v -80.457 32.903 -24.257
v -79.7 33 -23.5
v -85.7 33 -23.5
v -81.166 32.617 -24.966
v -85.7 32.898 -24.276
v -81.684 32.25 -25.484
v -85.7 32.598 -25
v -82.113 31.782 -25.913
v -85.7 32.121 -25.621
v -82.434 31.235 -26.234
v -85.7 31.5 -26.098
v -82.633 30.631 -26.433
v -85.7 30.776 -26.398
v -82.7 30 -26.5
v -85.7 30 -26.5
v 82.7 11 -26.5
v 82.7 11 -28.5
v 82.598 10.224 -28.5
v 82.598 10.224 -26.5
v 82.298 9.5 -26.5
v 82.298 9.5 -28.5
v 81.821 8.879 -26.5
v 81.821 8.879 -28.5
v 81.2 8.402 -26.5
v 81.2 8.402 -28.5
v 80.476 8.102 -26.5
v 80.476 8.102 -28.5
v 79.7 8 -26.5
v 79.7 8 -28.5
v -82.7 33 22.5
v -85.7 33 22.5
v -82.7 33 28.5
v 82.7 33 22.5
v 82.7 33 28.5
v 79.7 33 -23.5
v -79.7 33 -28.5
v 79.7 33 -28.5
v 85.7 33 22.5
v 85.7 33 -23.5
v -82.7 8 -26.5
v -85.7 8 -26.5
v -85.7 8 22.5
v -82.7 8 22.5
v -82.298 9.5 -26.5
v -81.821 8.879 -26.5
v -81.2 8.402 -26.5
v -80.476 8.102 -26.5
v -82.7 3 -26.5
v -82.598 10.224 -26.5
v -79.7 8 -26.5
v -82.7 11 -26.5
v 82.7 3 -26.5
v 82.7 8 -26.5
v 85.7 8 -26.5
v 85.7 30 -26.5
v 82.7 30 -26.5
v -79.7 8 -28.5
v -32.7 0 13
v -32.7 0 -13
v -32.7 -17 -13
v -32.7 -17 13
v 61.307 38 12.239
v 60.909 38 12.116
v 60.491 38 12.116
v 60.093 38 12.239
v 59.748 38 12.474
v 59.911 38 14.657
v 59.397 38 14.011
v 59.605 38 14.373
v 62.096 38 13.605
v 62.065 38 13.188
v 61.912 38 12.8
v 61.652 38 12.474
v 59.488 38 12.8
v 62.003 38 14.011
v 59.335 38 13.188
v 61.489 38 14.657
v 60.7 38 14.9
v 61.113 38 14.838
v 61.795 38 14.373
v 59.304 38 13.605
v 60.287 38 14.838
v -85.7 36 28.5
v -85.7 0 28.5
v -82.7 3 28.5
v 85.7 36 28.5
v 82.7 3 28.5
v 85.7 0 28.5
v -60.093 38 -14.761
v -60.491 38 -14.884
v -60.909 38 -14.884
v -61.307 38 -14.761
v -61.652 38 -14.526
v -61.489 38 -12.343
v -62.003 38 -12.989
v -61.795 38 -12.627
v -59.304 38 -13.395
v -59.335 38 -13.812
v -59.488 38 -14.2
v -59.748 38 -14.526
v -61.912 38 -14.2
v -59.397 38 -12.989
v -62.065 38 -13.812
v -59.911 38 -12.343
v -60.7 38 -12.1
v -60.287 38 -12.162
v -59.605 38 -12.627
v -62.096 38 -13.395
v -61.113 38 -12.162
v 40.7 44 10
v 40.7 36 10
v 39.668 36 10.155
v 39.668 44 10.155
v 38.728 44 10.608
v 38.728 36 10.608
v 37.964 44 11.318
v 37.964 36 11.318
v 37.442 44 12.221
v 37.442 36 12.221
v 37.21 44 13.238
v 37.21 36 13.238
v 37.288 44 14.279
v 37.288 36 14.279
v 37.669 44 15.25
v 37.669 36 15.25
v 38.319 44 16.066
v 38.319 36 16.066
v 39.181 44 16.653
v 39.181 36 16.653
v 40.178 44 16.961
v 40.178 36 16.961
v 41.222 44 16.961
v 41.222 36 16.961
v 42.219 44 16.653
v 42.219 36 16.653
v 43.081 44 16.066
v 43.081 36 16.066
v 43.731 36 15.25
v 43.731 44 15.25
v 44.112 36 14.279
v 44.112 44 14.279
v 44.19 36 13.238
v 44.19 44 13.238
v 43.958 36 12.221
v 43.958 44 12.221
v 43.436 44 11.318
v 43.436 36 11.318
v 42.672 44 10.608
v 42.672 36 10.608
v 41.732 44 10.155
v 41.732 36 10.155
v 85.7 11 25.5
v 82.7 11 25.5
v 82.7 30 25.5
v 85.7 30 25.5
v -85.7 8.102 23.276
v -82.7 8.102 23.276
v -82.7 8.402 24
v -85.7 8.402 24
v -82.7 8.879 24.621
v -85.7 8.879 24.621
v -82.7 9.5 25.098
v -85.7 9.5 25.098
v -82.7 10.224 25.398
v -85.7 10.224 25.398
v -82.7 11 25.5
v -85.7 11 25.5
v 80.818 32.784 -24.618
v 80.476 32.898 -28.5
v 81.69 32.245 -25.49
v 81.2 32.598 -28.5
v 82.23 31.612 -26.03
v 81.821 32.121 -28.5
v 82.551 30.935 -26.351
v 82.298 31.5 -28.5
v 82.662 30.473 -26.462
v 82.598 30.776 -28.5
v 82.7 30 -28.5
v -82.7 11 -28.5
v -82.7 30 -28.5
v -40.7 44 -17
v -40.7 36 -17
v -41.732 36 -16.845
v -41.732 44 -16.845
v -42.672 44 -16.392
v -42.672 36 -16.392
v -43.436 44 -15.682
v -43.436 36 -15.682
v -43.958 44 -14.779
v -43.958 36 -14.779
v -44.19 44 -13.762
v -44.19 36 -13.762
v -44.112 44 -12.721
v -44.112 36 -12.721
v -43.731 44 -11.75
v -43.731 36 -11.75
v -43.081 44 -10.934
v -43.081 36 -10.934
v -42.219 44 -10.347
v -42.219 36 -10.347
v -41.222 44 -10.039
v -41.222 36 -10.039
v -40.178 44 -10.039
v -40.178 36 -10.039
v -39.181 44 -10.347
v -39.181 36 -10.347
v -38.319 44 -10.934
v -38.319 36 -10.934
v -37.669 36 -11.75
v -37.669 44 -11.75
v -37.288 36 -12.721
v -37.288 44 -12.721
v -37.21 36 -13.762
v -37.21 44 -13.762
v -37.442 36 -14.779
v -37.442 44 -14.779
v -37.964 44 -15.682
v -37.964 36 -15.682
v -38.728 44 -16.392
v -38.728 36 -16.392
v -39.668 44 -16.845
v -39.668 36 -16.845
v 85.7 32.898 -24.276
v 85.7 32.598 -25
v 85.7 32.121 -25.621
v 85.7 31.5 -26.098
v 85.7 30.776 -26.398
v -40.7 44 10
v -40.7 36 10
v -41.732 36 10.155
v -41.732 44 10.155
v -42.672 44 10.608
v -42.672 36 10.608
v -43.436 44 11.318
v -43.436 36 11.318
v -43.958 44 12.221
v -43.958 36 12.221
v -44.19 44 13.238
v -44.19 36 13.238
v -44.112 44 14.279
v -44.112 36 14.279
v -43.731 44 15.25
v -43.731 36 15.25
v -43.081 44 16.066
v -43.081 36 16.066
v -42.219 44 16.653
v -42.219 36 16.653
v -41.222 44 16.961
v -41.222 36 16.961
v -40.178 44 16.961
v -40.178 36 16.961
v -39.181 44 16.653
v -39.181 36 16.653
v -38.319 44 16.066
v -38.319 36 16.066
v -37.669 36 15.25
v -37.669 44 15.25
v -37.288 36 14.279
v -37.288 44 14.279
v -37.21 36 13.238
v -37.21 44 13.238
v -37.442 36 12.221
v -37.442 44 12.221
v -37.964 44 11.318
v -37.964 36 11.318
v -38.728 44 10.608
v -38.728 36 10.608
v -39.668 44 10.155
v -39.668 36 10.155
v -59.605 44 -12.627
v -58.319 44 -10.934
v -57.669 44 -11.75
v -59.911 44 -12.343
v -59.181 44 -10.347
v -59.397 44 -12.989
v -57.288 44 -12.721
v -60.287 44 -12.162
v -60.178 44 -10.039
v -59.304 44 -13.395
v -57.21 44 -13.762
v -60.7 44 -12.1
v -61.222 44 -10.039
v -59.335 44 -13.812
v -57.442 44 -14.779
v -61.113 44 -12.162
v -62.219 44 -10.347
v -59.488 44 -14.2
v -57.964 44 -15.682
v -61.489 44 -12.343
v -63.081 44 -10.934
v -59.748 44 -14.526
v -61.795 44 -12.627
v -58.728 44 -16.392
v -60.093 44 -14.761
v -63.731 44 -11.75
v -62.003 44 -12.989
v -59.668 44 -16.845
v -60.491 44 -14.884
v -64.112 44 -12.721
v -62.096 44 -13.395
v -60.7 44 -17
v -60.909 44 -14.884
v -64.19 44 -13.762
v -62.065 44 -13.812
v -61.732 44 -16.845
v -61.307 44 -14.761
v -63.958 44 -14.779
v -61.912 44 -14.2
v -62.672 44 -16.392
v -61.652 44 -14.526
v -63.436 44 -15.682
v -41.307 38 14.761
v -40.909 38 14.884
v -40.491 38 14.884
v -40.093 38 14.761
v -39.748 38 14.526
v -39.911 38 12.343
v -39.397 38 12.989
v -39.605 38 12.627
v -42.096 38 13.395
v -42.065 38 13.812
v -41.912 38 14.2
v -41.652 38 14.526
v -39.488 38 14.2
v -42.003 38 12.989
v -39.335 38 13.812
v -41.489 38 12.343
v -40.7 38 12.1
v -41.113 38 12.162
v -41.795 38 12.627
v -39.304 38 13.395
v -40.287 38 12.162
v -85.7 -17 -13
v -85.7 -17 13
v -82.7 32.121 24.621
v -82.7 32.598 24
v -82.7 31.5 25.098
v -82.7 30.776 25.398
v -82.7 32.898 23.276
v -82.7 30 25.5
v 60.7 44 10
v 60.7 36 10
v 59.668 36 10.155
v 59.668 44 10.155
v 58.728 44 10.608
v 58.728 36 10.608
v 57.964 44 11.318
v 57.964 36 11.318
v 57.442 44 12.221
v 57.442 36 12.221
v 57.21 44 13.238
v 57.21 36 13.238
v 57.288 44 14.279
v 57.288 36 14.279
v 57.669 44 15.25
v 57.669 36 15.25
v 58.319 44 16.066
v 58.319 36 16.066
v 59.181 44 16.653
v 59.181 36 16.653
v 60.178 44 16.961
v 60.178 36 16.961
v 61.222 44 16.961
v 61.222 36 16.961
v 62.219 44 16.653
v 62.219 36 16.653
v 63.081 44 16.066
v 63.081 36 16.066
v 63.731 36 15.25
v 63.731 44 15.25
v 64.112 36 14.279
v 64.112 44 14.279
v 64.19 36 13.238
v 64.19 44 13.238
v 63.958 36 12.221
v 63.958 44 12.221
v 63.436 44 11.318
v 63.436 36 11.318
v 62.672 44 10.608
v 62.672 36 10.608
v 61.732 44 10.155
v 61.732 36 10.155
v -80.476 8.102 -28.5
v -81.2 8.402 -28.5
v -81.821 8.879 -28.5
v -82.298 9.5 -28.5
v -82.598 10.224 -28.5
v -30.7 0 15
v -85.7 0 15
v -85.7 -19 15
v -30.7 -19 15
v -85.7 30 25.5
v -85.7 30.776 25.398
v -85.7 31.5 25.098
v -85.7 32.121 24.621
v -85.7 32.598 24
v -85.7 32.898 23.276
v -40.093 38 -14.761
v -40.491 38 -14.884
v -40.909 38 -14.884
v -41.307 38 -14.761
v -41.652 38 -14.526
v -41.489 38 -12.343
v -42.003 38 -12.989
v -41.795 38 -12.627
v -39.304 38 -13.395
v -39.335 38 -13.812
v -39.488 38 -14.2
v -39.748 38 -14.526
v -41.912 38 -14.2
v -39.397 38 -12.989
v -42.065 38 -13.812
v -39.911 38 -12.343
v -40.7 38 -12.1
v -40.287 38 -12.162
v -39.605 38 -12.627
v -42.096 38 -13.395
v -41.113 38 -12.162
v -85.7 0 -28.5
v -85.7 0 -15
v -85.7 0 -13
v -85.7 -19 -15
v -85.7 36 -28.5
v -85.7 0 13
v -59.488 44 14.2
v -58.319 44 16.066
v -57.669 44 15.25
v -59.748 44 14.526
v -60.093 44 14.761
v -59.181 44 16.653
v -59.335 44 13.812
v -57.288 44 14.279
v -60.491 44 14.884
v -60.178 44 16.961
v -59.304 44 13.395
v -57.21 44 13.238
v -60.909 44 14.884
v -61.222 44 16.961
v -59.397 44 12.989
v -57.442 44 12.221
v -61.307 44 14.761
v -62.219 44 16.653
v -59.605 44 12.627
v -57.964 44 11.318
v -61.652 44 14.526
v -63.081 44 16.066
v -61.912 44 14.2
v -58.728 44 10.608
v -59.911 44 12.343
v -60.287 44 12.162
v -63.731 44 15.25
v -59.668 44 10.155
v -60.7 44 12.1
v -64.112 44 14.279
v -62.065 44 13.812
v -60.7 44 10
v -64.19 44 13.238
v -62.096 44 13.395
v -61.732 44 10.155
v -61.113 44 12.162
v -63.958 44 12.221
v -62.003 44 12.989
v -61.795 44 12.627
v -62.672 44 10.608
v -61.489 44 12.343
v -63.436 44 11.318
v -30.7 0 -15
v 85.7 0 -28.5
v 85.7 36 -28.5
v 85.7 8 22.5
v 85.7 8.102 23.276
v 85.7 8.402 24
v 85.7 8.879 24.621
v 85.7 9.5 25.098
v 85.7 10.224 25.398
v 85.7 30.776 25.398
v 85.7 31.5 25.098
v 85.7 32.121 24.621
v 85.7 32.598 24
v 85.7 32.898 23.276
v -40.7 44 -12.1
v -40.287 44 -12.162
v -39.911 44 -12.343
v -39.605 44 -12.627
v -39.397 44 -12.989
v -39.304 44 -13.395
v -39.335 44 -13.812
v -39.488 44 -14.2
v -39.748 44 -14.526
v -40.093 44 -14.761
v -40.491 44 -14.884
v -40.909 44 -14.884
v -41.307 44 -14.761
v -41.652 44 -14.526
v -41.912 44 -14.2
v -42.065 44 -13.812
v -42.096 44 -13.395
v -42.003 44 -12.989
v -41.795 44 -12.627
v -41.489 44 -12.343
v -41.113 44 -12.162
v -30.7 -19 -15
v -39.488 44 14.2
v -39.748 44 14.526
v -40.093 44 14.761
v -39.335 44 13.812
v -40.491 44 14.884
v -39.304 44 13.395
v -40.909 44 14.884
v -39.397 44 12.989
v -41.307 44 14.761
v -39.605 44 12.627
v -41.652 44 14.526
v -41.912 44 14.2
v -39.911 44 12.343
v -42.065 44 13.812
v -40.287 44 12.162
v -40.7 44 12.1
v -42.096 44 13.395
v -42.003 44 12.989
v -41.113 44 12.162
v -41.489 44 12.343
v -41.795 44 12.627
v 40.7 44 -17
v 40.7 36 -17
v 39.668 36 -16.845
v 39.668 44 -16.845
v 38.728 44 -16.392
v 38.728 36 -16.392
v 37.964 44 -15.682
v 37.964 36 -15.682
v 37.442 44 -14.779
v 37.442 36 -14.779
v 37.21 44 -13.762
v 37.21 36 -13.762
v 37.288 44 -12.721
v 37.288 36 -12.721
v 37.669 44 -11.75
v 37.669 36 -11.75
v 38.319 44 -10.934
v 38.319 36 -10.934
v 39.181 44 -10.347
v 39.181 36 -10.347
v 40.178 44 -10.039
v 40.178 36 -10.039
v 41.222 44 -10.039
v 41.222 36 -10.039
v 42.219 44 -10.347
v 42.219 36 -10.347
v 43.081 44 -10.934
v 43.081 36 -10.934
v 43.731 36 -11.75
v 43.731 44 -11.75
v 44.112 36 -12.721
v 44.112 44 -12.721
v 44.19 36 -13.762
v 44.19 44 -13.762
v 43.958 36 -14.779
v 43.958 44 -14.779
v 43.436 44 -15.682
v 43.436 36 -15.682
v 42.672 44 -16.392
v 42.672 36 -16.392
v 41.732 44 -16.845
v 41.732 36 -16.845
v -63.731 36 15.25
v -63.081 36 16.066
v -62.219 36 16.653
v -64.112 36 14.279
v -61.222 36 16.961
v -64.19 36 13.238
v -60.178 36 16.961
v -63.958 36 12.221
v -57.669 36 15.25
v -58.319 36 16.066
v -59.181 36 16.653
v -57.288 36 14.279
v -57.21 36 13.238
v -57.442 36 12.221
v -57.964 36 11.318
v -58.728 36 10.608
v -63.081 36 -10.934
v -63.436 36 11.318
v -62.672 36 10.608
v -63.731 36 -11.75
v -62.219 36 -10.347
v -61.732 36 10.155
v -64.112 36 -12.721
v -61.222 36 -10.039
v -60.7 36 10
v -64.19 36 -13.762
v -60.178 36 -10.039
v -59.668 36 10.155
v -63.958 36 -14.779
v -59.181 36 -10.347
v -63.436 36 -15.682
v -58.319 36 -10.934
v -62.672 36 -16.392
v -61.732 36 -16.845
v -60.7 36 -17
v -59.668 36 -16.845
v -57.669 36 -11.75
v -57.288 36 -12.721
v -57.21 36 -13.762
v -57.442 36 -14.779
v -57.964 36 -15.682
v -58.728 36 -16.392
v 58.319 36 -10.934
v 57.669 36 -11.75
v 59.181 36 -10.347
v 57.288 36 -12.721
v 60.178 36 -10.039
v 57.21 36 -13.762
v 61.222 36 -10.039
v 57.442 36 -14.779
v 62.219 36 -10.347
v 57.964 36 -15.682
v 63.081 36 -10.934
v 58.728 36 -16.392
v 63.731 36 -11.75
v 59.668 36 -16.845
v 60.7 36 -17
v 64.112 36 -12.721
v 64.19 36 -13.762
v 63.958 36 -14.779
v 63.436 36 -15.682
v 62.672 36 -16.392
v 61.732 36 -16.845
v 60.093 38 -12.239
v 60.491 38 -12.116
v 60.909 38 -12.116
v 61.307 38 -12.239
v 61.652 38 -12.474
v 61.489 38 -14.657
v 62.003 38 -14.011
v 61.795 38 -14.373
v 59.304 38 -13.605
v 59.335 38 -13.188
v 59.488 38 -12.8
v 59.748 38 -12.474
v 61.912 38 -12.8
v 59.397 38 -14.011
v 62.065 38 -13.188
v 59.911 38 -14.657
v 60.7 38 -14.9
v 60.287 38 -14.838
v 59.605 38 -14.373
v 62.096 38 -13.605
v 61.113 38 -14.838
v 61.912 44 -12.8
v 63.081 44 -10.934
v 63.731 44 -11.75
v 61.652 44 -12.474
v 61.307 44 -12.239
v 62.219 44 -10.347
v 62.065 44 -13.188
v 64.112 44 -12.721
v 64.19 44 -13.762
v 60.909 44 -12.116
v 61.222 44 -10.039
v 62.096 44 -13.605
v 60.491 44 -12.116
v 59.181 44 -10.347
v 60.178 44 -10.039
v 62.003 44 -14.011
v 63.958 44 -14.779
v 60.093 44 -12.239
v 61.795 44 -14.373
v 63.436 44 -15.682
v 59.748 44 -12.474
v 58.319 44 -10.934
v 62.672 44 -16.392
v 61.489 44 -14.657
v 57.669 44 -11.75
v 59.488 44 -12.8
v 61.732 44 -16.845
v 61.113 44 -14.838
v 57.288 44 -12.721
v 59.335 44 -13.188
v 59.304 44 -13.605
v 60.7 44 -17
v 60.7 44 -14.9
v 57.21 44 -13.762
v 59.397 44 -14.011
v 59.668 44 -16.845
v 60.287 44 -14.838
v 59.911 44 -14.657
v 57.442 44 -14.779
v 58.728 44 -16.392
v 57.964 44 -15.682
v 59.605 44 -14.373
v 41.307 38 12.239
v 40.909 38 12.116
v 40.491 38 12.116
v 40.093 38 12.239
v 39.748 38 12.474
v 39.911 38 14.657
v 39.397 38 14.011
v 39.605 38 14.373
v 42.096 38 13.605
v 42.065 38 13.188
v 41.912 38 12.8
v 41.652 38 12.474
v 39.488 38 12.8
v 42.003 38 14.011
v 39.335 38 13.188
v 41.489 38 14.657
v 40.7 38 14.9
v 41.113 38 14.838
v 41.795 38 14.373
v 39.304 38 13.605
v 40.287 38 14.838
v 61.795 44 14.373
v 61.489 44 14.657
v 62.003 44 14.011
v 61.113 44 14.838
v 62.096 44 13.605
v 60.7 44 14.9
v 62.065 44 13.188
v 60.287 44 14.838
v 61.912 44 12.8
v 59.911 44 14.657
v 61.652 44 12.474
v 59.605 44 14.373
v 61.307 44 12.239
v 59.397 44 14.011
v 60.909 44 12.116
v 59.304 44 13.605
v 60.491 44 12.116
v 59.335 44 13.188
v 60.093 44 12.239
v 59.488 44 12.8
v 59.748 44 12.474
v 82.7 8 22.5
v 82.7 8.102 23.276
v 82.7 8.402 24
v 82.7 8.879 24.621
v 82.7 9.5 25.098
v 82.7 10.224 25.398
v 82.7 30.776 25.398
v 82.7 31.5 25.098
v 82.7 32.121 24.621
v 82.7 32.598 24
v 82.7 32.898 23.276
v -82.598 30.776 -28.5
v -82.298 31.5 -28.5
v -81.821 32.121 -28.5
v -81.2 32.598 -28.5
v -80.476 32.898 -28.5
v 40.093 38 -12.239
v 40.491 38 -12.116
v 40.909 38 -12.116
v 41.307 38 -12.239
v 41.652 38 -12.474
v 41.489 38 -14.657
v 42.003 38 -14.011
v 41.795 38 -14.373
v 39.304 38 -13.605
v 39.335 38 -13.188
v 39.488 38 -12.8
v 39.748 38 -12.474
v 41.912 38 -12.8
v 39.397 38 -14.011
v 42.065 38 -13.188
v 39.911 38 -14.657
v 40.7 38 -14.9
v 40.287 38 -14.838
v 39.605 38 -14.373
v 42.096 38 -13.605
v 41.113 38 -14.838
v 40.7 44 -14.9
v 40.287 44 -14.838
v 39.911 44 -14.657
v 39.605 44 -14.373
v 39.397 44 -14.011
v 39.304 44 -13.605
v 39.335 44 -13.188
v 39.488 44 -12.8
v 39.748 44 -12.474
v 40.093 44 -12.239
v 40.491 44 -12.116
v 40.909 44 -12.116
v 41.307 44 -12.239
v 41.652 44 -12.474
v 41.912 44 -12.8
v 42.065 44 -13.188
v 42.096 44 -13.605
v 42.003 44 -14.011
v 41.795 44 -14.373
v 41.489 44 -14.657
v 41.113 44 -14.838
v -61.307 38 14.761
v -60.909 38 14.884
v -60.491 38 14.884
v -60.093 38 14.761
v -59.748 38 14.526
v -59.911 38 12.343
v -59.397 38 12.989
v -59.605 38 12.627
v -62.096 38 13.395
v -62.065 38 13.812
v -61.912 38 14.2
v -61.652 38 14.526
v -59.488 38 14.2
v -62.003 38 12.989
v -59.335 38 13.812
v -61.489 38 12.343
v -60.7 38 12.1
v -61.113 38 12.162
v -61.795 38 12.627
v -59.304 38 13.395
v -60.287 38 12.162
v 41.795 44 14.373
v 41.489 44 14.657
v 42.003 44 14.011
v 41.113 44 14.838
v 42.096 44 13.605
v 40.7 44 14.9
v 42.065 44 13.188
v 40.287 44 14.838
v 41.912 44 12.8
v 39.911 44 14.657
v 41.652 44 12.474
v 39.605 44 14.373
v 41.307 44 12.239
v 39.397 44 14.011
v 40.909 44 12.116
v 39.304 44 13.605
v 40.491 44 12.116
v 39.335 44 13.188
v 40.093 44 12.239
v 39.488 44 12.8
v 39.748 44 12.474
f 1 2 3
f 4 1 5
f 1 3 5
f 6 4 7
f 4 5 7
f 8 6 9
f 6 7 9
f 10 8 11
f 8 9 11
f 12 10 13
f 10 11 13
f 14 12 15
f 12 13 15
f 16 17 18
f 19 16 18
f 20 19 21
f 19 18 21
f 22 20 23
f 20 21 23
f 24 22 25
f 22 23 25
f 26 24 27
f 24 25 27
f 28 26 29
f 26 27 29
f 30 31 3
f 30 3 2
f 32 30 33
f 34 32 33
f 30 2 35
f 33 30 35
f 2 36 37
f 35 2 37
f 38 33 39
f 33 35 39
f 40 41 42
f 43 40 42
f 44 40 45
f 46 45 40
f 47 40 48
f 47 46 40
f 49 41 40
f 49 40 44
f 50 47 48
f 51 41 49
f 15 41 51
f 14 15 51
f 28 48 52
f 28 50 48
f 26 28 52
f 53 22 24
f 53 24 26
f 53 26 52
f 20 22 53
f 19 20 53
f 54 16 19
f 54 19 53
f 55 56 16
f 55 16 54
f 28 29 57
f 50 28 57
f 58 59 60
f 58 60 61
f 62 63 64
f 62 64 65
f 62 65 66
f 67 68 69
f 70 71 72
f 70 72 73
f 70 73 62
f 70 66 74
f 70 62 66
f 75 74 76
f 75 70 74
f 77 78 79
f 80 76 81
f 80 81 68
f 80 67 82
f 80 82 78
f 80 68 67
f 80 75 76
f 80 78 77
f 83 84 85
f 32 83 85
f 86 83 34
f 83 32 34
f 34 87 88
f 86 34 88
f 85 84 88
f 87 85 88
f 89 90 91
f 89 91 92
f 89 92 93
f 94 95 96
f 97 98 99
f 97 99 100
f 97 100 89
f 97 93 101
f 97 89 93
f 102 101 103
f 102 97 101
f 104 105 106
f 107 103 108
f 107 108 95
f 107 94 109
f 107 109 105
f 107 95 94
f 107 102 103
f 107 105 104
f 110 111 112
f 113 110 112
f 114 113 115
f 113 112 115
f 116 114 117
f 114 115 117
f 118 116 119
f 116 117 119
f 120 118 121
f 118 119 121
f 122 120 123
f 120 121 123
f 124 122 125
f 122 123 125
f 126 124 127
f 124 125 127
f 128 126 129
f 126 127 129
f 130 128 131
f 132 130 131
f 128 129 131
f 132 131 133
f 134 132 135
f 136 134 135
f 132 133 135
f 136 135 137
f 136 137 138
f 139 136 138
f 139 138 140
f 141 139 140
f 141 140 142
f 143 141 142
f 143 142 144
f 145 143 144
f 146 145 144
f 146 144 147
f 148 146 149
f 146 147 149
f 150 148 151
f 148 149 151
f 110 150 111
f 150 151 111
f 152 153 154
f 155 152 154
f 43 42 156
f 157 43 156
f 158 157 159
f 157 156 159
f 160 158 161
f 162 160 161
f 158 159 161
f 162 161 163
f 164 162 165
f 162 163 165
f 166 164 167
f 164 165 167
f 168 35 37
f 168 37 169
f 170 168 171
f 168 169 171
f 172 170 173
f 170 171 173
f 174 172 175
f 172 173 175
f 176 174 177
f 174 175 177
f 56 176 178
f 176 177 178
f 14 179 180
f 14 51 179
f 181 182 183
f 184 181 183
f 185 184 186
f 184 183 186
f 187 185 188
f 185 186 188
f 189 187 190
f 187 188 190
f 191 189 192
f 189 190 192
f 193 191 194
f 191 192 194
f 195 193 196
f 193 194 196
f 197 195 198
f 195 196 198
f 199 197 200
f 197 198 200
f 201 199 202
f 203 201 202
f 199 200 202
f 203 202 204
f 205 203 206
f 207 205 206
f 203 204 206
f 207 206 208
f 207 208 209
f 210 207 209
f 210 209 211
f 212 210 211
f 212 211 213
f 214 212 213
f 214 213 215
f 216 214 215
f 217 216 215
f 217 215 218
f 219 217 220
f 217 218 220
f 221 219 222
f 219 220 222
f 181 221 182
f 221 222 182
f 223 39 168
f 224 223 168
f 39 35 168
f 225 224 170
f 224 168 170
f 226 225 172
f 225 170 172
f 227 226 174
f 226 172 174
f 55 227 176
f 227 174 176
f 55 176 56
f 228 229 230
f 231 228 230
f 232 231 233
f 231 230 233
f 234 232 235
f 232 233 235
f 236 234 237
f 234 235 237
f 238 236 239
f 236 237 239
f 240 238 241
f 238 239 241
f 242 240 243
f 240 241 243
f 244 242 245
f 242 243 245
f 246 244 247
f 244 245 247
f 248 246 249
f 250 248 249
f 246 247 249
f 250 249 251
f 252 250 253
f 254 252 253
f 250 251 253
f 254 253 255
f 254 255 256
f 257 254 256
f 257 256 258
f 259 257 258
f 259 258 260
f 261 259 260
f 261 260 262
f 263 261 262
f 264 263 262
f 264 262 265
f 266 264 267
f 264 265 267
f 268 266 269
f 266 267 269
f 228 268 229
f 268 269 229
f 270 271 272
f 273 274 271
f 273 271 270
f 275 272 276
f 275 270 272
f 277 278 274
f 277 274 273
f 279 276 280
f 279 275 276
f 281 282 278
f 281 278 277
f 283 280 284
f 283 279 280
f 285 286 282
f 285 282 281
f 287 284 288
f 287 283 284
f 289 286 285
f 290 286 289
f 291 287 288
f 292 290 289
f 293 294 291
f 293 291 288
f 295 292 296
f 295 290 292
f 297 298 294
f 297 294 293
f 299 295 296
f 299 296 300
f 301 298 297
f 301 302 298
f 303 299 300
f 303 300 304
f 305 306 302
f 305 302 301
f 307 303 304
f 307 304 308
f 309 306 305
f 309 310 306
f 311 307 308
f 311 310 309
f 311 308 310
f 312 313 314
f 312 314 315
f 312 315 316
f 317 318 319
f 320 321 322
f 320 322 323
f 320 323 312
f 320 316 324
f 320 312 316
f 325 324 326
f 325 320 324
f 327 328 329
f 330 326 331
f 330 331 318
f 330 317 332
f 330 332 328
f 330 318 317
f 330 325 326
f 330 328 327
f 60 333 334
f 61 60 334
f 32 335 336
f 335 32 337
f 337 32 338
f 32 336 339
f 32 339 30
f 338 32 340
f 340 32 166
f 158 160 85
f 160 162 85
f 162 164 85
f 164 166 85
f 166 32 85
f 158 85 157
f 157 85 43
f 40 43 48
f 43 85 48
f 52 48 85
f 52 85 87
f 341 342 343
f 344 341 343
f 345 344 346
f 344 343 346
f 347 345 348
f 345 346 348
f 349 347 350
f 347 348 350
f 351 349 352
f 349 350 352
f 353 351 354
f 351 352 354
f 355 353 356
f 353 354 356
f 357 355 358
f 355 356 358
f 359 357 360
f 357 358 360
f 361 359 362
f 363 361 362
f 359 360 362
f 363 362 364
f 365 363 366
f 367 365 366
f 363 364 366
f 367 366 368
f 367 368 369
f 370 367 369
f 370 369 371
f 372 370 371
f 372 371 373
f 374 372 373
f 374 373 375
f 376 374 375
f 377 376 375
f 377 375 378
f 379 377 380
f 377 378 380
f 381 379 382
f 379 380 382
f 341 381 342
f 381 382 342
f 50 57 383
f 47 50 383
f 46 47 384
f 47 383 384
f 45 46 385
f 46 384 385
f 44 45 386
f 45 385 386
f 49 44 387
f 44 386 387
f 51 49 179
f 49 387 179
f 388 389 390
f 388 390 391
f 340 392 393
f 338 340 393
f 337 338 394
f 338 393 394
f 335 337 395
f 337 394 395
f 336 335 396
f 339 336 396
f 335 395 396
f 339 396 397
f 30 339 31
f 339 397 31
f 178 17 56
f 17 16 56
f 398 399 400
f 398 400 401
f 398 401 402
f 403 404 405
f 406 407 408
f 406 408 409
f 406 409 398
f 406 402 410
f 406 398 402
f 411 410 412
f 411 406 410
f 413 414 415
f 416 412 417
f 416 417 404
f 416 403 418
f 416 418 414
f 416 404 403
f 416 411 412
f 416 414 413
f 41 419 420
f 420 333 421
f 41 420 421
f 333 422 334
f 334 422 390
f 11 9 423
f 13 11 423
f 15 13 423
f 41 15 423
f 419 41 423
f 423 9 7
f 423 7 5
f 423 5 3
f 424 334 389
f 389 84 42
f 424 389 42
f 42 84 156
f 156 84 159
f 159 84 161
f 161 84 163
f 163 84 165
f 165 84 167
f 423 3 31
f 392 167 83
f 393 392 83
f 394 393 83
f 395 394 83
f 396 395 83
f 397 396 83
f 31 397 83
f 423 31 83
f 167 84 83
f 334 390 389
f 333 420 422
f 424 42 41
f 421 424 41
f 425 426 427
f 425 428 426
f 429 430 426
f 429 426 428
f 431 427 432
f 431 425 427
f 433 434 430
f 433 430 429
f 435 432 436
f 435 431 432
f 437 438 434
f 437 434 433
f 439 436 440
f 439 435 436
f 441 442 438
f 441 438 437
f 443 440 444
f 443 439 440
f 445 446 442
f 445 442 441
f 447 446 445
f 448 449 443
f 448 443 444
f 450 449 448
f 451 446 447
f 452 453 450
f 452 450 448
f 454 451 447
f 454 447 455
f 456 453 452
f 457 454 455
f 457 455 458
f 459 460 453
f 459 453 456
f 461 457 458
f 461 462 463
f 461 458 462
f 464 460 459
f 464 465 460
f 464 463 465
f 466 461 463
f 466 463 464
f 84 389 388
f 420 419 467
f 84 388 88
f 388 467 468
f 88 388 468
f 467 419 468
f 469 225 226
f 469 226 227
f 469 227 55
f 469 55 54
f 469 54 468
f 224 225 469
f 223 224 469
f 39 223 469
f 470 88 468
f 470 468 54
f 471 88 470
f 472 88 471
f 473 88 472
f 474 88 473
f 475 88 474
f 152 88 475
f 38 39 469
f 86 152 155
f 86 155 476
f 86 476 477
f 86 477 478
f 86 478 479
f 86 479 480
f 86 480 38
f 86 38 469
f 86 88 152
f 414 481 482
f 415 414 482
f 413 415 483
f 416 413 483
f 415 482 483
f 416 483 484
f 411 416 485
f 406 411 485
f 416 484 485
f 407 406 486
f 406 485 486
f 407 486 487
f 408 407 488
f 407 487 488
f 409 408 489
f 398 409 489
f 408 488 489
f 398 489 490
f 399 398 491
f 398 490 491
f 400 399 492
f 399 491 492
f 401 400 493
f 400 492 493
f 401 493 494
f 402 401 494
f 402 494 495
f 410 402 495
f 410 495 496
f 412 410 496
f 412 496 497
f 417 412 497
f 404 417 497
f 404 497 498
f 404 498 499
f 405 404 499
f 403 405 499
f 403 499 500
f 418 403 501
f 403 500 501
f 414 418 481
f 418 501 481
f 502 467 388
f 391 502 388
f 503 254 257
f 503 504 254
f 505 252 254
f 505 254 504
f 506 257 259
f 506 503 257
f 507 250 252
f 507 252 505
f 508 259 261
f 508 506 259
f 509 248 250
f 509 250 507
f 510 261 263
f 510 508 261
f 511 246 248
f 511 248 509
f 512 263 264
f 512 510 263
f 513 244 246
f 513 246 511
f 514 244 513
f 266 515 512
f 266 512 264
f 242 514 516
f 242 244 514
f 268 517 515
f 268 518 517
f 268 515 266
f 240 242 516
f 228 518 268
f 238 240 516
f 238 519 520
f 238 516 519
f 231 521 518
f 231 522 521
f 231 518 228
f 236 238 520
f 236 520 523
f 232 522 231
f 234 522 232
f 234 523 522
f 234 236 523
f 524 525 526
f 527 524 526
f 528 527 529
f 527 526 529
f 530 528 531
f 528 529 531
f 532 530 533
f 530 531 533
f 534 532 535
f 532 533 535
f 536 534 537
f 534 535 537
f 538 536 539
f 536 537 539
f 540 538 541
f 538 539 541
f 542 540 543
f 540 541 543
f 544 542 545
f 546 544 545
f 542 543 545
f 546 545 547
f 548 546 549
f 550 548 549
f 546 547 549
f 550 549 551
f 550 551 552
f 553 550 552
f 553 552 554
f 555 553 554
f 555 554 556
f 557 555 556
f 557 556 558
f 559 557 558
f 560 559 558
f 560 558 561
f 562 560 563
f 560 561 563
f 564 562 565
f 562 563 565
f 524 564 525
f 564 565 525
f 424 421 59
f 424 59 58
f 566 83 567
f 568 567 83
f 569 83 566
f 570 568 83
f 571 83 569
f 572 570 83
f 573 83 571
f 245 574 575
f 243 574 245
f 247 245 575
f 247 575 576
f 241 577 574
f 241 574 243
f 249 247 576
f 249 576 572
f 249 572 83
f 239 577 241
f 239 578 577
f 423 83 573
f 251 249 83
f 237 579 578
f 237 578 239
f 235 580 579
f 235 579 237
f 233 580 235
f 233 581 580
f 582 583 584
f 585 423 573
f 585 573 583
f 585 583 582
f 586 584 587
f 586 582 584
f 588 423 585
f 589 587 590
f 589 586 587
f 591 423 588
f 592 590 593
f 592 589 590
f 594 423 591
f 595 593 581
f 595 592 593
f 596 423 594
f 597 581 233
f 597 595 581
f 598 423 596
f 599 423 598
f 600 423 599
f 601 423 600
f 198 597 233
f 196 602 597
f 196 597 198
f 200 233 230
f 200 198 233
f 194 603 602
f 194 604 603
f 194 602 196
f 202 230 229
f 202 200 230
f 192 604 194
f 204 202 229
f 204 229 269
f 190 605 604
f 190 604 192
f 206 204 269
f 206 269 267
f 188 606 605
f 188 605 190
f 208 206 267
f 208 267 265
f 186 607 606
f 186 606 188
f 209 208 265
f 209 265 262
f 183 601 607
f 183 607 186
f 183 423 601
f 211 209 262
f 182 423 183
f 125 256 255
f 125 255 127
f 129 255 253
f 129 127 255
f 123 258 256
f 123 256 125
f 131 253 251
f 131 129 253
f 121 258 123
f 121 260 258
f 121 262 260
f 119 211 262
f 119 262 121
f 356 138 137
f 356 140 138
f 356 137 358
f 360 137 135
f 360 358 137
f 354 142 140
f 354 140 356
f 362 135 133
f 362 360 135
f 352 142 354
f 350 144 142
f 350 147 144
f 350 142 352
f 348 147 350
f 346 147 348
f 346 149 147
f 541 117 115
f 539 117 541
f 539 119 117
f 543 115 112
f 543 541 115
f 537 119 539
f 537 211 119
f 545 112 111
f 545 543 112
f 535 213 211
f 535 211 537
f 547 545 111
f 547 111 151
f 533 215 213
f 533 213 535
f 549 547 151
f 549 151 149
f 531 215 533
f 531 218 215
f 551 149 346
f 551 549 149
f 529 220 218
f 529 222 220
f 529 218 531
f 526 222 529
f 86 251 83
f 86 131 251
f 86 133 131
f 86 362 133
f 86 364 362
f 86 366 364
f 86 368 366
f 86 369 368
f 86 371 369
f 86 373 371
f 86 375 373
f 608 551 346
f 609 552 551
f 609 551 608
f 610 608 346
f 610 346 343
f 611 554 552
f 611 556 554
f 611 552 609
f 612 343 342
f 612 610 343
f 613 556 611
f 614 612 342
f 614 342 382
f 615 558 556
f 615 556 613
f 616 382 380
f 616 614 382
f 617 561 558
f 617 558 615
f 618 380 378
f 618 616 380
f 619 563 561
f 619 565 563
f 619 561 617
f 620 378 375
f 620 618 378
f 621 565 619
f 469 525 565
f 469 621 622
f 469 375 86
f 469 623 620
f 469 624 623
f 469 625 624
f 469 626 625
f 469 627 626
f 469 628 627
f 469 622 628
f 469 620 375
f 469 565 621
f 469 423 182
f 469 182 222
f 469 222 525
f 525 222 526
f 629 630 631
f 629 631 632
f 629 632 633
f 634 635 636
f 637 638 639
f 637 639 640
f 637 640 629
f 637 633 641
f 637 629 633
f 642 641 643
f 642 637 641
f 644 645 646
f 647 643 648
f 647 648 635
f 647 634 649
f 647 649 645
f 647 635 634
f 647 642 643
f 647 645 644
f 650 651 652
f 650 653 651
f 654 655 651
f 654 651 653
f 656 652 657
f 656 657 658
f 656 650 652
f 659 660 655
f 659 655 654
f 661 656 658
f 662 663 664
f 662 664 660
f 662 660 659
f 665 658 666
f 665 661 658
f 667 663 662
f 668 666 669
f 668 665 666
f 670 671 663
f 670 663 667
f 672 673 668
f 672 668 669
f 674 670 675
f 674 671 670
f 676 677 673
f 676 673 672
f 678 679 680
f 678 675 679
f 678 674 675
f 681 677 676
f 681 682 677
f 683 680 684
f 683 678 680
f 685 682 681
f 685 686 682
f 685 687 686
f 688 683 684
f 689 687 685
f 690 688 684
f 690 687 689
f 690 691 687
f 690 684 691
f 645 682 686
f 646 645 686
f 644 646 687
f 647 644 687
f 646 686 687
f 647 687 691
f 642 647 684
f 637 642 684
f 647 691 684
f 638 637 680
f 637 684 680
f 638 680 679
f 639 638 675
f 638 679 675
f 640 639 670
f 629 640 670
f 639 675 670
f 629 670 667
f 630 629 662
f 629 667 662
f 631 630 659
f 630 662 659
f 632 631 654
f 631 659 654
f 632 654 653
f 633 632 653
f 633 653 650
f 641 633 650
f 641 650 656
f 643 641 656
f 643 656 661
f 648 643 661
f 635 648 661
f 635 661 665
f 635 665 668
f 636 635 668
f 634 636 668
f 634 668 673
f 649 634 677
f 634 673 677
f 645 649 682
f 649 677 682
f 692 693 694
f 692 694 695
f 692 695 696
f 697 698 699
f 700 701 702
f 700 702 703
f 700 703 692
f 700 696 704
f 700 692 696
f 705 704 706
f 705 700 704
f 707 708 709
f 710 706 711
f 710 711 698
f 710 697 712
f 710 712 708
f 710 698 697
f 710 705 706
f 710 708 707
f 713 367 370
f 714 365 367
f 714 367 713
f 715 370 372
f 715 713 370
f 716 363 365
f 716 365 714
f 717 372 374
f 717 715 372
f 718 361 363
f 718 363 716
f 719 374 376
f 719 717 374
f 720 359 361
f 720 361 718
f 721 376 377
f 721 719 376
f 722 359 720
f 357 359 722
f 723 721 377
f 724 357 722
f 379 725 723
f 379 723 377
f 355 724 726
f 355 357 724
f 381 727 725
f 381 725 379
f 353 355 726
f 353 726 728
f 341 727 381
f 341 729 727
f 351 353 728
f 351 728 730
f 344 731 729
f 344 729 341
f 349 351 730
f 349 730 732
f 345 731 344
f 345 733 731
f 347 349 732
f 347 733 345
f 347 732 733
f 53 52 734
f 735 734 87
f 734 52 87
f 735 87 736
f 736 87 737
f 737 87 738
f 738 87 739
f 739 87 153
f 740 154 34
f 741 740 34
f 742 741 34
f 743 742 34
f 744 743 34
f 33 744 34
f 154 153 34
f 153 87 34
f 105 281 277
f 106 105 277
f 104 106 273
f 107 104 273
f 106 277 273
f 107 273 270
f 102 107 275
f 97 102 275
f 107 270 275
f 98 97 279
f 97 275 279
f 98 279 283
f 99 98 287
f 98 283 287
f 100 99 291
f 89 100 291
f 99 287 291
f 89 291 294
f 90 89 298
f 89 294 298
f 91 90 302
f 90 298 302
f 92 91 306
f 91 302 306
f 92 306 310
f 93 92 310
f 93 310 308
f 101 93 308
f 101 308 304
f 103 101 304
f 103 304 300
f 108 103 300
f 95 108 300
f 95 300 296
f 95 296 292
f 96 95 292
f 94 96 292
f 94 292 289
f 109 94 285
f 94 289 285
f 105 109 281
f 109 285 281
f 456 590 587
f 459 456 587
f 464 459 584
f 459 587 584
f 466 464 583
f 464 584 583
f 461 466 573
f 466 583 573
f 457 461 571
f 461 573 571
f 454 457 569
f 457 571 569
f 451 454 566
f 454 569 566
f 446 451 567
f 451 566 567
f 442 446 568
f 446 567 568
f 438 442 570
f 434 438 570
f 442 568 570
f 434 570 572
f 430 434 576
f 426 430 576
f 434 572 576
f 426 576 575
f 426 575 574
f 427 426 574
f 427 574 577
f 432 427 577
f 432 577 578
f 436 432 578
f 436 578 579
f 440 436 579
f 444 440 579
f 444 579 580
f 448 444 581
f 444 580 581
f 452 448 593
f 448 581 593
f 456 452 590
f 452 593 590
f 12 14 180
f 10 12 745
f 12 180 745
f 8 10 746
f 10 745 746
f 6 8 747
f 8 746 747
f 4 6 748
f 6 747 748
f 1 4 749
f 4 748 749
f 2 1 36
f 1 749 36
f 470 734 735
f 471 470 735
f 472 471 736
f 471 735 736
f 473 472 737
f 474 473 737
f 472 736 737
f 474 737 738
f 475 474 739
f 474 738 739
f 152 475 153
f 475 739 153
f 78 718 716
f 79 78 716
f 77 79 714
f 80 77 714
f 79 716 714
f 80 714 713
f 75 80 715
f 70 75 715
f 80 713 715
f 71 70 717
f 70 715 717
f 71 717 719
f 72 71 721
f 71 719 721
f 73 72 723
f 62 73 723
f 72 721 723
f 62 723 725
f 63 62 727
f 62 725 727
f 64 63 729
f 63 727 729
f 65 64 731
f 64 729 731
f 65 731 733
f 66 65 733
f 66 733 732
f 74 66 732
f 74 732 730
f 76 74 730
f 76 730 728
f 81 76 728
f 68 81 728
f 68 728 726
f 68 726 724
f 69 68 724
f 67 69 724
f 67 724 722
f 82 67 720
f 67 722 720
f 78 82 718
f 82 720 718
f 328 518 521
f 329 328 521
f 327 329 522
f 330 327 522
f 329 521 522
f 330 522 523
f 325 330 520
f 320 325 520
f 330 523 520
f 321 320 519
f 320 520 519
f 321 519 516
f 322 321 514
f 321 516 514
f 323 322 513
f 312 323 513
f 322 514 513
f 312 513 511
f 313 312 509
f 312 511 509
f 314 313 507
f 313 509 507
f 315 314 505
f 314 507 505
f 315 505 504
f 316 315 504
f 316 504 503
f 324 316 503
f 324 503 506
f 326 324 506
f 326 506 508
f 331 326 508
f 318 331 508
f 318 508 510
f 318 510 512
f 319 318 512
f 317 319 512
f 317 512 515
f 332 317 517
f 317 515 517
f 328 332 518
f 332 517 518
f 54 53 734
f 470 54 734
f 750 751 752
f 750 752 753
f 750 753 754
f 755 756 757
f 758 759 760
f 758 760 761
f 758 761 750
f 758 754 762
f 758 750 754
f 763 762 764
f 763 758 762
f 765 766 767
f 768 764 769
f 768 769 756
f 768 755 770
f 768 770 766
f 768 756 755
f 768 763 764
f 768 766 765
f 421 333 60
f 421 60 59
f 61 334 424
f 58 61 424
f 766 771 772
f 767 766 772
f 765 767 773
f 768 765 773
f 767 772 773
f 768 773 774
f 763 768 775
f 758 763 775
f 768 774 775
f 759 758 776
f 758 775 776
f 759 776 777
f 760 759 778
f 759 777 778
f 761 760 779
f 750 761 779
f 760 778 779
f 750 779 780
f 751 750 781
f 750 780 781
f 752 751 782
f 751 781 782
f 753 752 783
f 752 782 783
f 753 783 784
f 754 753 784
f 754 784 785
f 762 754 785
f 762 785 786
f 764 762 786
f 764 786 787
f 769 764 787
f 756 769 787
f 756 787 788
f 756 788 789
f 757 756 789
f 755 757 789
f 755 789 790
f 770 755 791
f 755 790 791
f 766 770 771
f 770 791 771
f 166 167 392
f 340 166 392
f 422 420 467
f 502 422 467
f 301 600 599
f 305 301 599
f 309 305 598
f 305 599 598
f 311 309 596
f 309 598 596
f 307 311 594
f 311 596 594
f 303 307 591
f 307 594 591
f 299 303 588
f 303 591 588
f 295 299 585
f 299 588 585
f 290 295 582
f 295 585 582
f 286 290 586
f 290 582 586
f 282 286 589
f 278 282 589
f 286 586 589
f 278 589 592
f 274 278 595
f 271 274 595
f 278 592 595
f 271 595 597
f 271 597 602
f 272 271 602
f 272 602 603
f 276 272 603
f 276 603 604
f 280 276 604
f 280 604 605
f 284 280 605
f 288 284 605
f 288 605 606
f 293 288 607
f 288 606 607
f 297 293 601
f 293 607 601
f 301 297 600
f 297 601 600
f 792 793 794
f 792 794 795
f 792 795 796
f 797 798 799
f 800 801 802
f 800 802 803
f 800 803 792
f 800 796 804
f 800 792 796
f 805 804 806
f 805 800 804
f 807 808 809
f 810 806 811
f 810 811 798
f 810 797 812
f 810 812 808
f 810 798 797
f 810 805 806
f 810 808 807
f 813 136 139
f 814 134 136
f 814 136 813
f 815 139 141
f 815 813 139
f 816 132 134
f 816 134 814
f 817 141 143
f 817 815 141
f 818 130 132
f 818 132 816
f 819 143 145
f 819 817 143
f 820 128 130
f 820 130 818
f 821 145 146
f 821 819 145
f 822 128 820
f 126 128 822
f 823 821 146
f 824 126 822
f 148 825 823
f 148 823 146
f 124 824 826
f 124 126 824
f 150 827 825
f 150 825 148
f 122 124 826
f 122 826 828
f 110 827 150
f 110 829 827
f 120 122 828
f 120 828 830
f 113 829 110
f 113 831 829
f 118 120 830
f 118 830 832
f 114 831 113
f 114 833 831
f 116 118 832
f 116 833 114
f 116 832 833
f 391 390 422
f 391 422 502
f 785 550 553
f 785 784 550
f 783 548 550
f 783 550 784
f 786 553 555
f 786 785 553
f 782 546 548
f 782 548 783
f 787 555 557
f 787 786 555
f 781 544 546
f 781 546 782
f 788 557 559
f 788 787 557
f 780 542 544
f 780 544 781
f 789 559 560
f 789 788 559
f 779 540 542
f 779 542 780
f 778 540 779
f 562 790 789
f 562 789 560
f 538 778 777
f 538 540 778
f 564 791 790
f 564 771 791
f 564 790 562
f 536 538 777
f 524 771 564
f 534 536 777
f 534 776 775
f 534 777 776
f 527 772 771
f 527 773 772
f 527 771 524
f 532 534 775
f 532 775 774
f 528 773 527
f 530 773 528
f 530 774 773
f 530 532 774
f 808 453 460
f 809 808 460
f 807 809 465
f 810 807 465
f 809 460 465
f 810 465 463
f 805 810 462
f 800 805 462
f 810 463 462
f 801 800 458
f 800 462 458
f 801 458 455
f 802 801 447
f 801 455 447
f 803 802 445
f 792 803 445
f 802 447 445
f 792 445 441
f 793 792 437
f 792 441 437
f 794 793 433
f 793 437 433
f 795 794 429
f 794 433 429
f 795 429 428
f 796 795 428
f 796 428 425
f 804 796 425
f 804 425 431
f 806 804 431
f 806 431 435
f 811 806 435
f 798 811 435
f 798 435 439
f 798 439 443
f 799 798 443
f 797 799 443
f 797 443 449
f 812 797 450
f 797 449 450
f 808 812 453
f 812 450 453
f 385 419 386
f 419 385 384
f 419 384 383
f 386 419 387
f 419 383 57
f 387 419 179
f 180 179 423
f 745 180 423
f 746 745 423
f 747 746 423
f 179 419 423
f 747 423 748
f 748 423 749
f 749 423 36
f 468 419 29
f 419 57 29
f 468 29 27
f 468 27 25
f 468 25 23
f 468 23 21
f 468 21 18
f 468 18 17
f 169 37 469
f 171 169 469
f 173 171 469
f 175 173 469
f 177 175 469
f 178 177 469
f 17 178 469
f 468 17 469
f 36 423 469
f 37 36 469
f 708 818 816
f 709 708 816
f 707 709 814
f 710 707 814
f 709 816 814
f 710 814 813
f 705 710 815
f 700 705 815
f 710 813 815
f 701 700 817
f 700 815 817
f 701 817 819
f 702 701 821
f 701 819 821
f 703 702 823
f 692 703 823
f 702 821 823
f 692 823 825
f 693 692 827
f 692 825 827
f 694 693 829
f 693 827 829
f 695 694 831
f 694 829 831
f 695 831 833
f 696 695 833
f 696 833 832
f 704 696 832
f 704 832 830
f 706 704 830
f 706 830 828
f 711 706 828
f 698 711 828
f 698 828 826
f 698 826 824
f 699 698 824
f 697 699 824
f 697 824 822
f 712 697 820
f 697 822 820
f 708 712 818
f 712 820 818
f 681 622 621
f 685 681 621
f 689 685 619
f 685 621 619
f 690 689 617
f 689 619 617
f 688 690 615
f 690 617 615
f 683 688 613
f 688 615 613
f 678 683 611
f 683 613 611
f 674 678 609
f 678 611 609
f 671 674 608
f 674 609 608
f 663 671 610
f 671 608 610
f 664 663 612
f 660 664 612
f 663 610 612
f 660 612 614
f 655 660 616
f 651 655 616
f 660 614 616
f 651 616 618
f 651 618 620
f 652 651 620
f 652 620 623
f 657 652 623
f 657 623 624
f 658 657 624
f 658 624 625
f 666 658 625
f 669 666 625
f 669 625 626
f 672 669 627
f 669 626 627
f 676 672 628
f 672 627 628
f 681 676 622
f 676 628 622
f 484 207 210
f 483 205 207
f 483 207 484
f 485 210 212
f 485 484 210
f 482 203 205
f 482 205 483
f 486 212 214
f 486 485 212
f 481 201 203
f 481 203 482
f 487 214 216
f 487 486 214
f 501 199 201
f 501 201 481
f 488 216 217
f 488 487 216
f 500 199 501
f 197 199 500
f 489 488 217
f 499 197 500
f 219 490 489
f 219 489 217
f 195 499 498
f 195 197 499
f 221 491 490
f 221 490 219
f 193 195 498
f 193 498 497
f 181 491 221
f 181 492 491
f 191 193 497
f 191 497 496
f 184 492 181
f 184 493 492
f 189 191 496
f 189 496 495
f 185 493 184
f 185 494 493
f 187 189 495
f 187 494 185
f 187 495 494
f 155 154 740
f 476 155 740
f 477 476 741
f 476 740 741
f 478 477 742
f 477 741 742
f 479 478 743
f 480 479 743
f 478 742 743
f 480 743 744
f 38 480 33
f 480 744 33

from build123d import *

# Parameters (mm, degrees)
SKETCH1_W           = 171.4
SKETCH1_H           = 57
BOSS_EXTRUDE1_DEPTH = 3
BOSS_EXTRUDE2_DEPTH = 30
SKETCH3_W           = 52
SKETCH3_H           = 25
CUT_EXTRUDE1_DEPTH  = 192
SKETCH4_W           = 171.4
SKETCH4_H           = 57
BOSS_EXTRUDE3_DEPTH = 3
SKETCH5_R           = 3.5
BOSS_EXTRUDE4_DEPTH = 8
SKETCH6_R           = 1.4
CUT_EXTRUDE2_DEPTH  = 6
SKETCH8_W           = 165.4
SKETCH8_H           = 25
CUT_EXTRUDE3_DEPTH  = 6
FILLET2_START       = -85.7
FILLET2_DEPTH       = 3
FILLET2_START_2     = 82.7
FILLET2_2_DEPTH     = 3
FILLET2_START_3     = -28.5
FILLET2_3_DEPTH     = 5
FILLET2_4_DEPTH     = 2
FILLET2_START_4     = -82.7
FILLET2_5_DEPTH     = 165.4
SKETCH9_W           = 55
SKETCH9_H           = 30
BOSS_EXTRUDE5_DEPTH = 19
SKETCH10_W          = 26
SKETCH10_H          = 17
CUT_EXTRUDE4_DEPTH  = 53


with BuildPart() as part:
    # Sketch1 → Boss-Extrude1 (new body)
    with BuildSketch(Plane(origin=(0, 0, 0), x_dir=(1, 0, 0), z_dir=(0, 1, 0))):
        Rectangle(SKETCH1_W, SKETCH1_H)
    extrude(amount=BOSS_EXTRUDE1_DEPTH)

    # Sketch2 → Boss-Extrude2 (add)
    with BuildSketch(Plane(origin=(0, 3, 0), x_dir=(1, 0, 0), z_dir=(0, 1, 0))):
        Polygon((-85.7, -28.5), (-82.7, -28.5), (-82.7, 26.5), (82.7, 26.5), (82.7, -28.5), (85.7, -28.5), (85.7, 28.5), (-85.7, 28.5), align=None)
    extrude(amount=BOSS_EXTRUDE2_DEPTH)

    # Sketch3 → Cut-Extrude1 (cut)
    with BuildSketch(Plane.ZY.offset(85.7)):
        with Locations((-0.5, 20.5)):
            Rectangle(SKETCH3_W, SKETCH3_H)
    extrude(amount=-CUT_EXTRUDE1_DEPTH, mode=Mode.SUBTRACT)

    # Sketch4 → Boss-Extrude3 (add)
    with BuildSketch(Plane(origin=(0, 33, 0), x_dir=(1, 0, 0), z_dir=(0, 1, 0))):
        Rectangle(SKETCH4_W, SKETCH4_H)
    extrude(amount=BOSS_EXTRUDE3_DEPTH)

    # Sketch5 → Boss-Extrude4 (add)
    with BuildSketch(Plane(origin=(0, 36, 0), x_dir=(1, 0, 0), z_dir=(0, 1, 0))):
        with Locations(Location((-60.7, 13.5, 0), (0, 0, 90))):
            Circle(SKETCH5_R)
        with Locations(Location((-40.7, 13.5, 0), (0, 0, 90))):
            Circle(SKETCH5_R)
        with Locations(Location((-40.7, -13.5, 0), (0, 0, 90))):
            Circle(SKETCH5_R)
        with Locations(Location((-60.7, -13.5, 0), (0, 0, 90))):
            Circle(SKETCH5_R)
        with Locations(Location((60.7, -13.5, 0), (0, 0, 90))):
            Circle(SKETCH5_R)
        with Locations(Location((40.7, -13.5, 0), (0, 0, 90))):
            Circle(SKETCH5_R)
        with Locations(Location((40.7, 13.5, 0), (0, 0, 90))):
            Circle(SKETCH5_R)
        with Locations(Location((60.7, 13.5, 0), (0, 0, 90))):
            Circle(SKETCH5_R)
    extrude(amount=BOSS_EXTRUDE4_DEPTH)

    # Sketch6 → Cut-Extrude2 (cut)
    with BuildSketch(Plane(origin=(0, 44, 0), x_dir=(1, 0, 0), z_dir=(0, 1, 0))):
        with Locations(Location((-60.7, 13.5, 0), (0, 0, 270))):
            Circle(SKETCH6_R)
        with Locations(Location((-40.7, 13.5, 0), (0, 0, 270))):
            Circle(SKETCH6_R)
        with Locations(Location((-40.7, -13.5, 0), (0, 0, 90))):
            Circle(SKETCH6_R)
        with Locations(Location((-60.7, -13.5, 0), (0, 0, 90))):
            Circle(SKETCH6_R)
        with Locations(Location((60.7, -13.5, 0), (0, 0, 270))):
            Circle(SKETCH6_R)
        with Locations(Location((40.7, -13.5, 0), (0, 0, 270))):
            Circle(SKETCH6_R)
        with Locations(Location((40.7, 13.5, 0), (0, 0, 90))):
            Circle(SKETCH6_R)
        with Locations(Location((60.7, 13.5, 0), (0, 0, 90))):
            Circle(SKETCH6_R)
    extrude(amount=-CUT_EXTRUDE2_DEPTH, mode=Mode.SUBTRACT)

    # Sketch8 → Cut-Extrude3 (cut)
    with BuildSketch(Plane(origin=(0, 0, -28.5), x_dir=(-1, 0, 0), z_dir=(0, 0, -1))):
        with Locations((0, 20.5)):
            Rectangle(SKETCH8_W, SKETCH8_H)
    extrude(amount=-CUT_EXTRUDE3_DEPTH, mode=Mode.SUBTRACT)

    # Fillet2: read off the stored shape, not the designer's step
    # Fillet2 outline → Fillet2 (add)
    with BuildSketch(Plane.YZ.offset(FILLET2_START)):
        with BuildLine():
            ThreePointArc((33, -23.5), (32.121320344, -25.621320344), (30, -26.5))
            Line((30, -26.5), (33, -26.5))
            Line((33, -26.5), (33, -23.5))
        make_face()
        with BuildLine():
            ThreePointArc((30, 25.5), (32.121320344, 24.621320344), (33, 22.5))
            Line((33, 22.5), (33, 25.5))
            Line((33, 25.5), (30, 25.5))
        make_face()
        with BuildLine():
            Line((8, 25.5), (8, 22.5))
            ThreePointArc((8, 22.5), (8.878679656, 24.621320344), (11, 25.5))
            Line((11, 25.5), (8, 25.5))
        make_face()
    extrude(amount=FILLET2_DEPTH)

    # Fillet2 2 outline → Fillet2 2 (add)
    with BuildSketch(Plane.YZ.offset(FILLET2_START_2)):
        with BuildLine():
            ThreePointArc((33, -23.5), (32.121320344, -25.621320344), (30, -26.5))
            Line((30, -26.5), (33, -26.5))
            Line((33, -26.5), (33, -23.5))
        make_face()
        with BuildLine():
            ThreePointArc((30, 25.5), (32.121320344, 24.621320344), (33, 22.5))
            Line((33, 22.5), (33, 25.5))
            Line((33, 25.5), (30, 25.5))
        make_face()
        with BuildLine():
            Line((8, 25.5), (8, 22.5))
            ThreePointArc((8, 22.5), (8.878679656, 24.621320344), (11, 25.5))
            Line((11, 25.5), (8, 25.5))
        make_face()
    extrude(amount=FILLET2_2_DEPTH)

    # Fillet2 3 outline → Fillet2 3 (add)
    with BuildSketch(Plane.XY.offset(FILLET2_START_3)):
        with BuildLine():
            Line((82.7, 33), (79.7, 33))
            ThreePointArc((79.7, 33), (81.821320344, 32.121320344), (82.7, 30))
            Line((82.7, 30), (82.7, 33))
        make_face()
        with BuildLine():
            ThreePointArc((-82.7, 30), (-81.821320344, 32.121320344), (-79.7, 33))
            Line((-79.7, 33), (-82.7, 33))
            Line((-82.7, 33), (-82.7, 30))
        make_face()
    extrude(amount=FILLET2_3_DEPTH)

    # Fillet2 4 outline → Fillet2 4 (add)
    with BuildSketch(Plane.XY.offset(FILLET2_START_3)):
        with BuildLine():
            Line((82.7, 8), (82.7, 11))
            ThreePointArc((82.7, 11), (81.821320344, 8.878679656), (79.7, 8))
            Line((79.7, 8), (82.7, 8))
        make_face()
        with BuildLine():
            ThreePointArc((-79.7, 8), (-81.821320344, 8.878679656), (-82.7, 11))
            Line((-82.7, 11), (-82.7, 8))
            Line((-82.7, 8), (-79.7, 8))
        make_face()
    extrude(amount=FILLET2_4_DEPTH)

    # Fillet2 5 outline → Fillet2 5 (cut)
    with BuildSketch(Plane.YZ.offset(FILLET2_START_4)):
        with BuildLine():
            Line((30, -23.5), (30, -26.5))
            ThreePointArc((30, -26.5), (32.121320344, -25.621320344), (33, -23.5))
            Line((33, -23.5), (30, -23.5))
        make_face()
    extrude(amount=FILLET2_5_DEPTH, mode=Mode.SUBTRACT)

    # Sketch9 → Boss-Extrude5 (add)
    with BuildSketch(Plane.XZ):
        with Locations((-58.2, 0)):
            Rectangle(SKETCH9_W, SKETCH9_H)
    extrude(amount=BOSS_EXTRUDE5_DEPTH)

    # Sketch10 → Cut-Extrude4 (cut)
    with BuildSketch(Plane.ZY.offset(85.7)):
        with Locations((0, -8.5)):
            Rectangle(SKETCH10_W, SKETCH10_H)
    extrude(amount=-CUT_EXTRUDE4_DEPTH, mode=Mode.SUBTRACT)


solid = part.part
